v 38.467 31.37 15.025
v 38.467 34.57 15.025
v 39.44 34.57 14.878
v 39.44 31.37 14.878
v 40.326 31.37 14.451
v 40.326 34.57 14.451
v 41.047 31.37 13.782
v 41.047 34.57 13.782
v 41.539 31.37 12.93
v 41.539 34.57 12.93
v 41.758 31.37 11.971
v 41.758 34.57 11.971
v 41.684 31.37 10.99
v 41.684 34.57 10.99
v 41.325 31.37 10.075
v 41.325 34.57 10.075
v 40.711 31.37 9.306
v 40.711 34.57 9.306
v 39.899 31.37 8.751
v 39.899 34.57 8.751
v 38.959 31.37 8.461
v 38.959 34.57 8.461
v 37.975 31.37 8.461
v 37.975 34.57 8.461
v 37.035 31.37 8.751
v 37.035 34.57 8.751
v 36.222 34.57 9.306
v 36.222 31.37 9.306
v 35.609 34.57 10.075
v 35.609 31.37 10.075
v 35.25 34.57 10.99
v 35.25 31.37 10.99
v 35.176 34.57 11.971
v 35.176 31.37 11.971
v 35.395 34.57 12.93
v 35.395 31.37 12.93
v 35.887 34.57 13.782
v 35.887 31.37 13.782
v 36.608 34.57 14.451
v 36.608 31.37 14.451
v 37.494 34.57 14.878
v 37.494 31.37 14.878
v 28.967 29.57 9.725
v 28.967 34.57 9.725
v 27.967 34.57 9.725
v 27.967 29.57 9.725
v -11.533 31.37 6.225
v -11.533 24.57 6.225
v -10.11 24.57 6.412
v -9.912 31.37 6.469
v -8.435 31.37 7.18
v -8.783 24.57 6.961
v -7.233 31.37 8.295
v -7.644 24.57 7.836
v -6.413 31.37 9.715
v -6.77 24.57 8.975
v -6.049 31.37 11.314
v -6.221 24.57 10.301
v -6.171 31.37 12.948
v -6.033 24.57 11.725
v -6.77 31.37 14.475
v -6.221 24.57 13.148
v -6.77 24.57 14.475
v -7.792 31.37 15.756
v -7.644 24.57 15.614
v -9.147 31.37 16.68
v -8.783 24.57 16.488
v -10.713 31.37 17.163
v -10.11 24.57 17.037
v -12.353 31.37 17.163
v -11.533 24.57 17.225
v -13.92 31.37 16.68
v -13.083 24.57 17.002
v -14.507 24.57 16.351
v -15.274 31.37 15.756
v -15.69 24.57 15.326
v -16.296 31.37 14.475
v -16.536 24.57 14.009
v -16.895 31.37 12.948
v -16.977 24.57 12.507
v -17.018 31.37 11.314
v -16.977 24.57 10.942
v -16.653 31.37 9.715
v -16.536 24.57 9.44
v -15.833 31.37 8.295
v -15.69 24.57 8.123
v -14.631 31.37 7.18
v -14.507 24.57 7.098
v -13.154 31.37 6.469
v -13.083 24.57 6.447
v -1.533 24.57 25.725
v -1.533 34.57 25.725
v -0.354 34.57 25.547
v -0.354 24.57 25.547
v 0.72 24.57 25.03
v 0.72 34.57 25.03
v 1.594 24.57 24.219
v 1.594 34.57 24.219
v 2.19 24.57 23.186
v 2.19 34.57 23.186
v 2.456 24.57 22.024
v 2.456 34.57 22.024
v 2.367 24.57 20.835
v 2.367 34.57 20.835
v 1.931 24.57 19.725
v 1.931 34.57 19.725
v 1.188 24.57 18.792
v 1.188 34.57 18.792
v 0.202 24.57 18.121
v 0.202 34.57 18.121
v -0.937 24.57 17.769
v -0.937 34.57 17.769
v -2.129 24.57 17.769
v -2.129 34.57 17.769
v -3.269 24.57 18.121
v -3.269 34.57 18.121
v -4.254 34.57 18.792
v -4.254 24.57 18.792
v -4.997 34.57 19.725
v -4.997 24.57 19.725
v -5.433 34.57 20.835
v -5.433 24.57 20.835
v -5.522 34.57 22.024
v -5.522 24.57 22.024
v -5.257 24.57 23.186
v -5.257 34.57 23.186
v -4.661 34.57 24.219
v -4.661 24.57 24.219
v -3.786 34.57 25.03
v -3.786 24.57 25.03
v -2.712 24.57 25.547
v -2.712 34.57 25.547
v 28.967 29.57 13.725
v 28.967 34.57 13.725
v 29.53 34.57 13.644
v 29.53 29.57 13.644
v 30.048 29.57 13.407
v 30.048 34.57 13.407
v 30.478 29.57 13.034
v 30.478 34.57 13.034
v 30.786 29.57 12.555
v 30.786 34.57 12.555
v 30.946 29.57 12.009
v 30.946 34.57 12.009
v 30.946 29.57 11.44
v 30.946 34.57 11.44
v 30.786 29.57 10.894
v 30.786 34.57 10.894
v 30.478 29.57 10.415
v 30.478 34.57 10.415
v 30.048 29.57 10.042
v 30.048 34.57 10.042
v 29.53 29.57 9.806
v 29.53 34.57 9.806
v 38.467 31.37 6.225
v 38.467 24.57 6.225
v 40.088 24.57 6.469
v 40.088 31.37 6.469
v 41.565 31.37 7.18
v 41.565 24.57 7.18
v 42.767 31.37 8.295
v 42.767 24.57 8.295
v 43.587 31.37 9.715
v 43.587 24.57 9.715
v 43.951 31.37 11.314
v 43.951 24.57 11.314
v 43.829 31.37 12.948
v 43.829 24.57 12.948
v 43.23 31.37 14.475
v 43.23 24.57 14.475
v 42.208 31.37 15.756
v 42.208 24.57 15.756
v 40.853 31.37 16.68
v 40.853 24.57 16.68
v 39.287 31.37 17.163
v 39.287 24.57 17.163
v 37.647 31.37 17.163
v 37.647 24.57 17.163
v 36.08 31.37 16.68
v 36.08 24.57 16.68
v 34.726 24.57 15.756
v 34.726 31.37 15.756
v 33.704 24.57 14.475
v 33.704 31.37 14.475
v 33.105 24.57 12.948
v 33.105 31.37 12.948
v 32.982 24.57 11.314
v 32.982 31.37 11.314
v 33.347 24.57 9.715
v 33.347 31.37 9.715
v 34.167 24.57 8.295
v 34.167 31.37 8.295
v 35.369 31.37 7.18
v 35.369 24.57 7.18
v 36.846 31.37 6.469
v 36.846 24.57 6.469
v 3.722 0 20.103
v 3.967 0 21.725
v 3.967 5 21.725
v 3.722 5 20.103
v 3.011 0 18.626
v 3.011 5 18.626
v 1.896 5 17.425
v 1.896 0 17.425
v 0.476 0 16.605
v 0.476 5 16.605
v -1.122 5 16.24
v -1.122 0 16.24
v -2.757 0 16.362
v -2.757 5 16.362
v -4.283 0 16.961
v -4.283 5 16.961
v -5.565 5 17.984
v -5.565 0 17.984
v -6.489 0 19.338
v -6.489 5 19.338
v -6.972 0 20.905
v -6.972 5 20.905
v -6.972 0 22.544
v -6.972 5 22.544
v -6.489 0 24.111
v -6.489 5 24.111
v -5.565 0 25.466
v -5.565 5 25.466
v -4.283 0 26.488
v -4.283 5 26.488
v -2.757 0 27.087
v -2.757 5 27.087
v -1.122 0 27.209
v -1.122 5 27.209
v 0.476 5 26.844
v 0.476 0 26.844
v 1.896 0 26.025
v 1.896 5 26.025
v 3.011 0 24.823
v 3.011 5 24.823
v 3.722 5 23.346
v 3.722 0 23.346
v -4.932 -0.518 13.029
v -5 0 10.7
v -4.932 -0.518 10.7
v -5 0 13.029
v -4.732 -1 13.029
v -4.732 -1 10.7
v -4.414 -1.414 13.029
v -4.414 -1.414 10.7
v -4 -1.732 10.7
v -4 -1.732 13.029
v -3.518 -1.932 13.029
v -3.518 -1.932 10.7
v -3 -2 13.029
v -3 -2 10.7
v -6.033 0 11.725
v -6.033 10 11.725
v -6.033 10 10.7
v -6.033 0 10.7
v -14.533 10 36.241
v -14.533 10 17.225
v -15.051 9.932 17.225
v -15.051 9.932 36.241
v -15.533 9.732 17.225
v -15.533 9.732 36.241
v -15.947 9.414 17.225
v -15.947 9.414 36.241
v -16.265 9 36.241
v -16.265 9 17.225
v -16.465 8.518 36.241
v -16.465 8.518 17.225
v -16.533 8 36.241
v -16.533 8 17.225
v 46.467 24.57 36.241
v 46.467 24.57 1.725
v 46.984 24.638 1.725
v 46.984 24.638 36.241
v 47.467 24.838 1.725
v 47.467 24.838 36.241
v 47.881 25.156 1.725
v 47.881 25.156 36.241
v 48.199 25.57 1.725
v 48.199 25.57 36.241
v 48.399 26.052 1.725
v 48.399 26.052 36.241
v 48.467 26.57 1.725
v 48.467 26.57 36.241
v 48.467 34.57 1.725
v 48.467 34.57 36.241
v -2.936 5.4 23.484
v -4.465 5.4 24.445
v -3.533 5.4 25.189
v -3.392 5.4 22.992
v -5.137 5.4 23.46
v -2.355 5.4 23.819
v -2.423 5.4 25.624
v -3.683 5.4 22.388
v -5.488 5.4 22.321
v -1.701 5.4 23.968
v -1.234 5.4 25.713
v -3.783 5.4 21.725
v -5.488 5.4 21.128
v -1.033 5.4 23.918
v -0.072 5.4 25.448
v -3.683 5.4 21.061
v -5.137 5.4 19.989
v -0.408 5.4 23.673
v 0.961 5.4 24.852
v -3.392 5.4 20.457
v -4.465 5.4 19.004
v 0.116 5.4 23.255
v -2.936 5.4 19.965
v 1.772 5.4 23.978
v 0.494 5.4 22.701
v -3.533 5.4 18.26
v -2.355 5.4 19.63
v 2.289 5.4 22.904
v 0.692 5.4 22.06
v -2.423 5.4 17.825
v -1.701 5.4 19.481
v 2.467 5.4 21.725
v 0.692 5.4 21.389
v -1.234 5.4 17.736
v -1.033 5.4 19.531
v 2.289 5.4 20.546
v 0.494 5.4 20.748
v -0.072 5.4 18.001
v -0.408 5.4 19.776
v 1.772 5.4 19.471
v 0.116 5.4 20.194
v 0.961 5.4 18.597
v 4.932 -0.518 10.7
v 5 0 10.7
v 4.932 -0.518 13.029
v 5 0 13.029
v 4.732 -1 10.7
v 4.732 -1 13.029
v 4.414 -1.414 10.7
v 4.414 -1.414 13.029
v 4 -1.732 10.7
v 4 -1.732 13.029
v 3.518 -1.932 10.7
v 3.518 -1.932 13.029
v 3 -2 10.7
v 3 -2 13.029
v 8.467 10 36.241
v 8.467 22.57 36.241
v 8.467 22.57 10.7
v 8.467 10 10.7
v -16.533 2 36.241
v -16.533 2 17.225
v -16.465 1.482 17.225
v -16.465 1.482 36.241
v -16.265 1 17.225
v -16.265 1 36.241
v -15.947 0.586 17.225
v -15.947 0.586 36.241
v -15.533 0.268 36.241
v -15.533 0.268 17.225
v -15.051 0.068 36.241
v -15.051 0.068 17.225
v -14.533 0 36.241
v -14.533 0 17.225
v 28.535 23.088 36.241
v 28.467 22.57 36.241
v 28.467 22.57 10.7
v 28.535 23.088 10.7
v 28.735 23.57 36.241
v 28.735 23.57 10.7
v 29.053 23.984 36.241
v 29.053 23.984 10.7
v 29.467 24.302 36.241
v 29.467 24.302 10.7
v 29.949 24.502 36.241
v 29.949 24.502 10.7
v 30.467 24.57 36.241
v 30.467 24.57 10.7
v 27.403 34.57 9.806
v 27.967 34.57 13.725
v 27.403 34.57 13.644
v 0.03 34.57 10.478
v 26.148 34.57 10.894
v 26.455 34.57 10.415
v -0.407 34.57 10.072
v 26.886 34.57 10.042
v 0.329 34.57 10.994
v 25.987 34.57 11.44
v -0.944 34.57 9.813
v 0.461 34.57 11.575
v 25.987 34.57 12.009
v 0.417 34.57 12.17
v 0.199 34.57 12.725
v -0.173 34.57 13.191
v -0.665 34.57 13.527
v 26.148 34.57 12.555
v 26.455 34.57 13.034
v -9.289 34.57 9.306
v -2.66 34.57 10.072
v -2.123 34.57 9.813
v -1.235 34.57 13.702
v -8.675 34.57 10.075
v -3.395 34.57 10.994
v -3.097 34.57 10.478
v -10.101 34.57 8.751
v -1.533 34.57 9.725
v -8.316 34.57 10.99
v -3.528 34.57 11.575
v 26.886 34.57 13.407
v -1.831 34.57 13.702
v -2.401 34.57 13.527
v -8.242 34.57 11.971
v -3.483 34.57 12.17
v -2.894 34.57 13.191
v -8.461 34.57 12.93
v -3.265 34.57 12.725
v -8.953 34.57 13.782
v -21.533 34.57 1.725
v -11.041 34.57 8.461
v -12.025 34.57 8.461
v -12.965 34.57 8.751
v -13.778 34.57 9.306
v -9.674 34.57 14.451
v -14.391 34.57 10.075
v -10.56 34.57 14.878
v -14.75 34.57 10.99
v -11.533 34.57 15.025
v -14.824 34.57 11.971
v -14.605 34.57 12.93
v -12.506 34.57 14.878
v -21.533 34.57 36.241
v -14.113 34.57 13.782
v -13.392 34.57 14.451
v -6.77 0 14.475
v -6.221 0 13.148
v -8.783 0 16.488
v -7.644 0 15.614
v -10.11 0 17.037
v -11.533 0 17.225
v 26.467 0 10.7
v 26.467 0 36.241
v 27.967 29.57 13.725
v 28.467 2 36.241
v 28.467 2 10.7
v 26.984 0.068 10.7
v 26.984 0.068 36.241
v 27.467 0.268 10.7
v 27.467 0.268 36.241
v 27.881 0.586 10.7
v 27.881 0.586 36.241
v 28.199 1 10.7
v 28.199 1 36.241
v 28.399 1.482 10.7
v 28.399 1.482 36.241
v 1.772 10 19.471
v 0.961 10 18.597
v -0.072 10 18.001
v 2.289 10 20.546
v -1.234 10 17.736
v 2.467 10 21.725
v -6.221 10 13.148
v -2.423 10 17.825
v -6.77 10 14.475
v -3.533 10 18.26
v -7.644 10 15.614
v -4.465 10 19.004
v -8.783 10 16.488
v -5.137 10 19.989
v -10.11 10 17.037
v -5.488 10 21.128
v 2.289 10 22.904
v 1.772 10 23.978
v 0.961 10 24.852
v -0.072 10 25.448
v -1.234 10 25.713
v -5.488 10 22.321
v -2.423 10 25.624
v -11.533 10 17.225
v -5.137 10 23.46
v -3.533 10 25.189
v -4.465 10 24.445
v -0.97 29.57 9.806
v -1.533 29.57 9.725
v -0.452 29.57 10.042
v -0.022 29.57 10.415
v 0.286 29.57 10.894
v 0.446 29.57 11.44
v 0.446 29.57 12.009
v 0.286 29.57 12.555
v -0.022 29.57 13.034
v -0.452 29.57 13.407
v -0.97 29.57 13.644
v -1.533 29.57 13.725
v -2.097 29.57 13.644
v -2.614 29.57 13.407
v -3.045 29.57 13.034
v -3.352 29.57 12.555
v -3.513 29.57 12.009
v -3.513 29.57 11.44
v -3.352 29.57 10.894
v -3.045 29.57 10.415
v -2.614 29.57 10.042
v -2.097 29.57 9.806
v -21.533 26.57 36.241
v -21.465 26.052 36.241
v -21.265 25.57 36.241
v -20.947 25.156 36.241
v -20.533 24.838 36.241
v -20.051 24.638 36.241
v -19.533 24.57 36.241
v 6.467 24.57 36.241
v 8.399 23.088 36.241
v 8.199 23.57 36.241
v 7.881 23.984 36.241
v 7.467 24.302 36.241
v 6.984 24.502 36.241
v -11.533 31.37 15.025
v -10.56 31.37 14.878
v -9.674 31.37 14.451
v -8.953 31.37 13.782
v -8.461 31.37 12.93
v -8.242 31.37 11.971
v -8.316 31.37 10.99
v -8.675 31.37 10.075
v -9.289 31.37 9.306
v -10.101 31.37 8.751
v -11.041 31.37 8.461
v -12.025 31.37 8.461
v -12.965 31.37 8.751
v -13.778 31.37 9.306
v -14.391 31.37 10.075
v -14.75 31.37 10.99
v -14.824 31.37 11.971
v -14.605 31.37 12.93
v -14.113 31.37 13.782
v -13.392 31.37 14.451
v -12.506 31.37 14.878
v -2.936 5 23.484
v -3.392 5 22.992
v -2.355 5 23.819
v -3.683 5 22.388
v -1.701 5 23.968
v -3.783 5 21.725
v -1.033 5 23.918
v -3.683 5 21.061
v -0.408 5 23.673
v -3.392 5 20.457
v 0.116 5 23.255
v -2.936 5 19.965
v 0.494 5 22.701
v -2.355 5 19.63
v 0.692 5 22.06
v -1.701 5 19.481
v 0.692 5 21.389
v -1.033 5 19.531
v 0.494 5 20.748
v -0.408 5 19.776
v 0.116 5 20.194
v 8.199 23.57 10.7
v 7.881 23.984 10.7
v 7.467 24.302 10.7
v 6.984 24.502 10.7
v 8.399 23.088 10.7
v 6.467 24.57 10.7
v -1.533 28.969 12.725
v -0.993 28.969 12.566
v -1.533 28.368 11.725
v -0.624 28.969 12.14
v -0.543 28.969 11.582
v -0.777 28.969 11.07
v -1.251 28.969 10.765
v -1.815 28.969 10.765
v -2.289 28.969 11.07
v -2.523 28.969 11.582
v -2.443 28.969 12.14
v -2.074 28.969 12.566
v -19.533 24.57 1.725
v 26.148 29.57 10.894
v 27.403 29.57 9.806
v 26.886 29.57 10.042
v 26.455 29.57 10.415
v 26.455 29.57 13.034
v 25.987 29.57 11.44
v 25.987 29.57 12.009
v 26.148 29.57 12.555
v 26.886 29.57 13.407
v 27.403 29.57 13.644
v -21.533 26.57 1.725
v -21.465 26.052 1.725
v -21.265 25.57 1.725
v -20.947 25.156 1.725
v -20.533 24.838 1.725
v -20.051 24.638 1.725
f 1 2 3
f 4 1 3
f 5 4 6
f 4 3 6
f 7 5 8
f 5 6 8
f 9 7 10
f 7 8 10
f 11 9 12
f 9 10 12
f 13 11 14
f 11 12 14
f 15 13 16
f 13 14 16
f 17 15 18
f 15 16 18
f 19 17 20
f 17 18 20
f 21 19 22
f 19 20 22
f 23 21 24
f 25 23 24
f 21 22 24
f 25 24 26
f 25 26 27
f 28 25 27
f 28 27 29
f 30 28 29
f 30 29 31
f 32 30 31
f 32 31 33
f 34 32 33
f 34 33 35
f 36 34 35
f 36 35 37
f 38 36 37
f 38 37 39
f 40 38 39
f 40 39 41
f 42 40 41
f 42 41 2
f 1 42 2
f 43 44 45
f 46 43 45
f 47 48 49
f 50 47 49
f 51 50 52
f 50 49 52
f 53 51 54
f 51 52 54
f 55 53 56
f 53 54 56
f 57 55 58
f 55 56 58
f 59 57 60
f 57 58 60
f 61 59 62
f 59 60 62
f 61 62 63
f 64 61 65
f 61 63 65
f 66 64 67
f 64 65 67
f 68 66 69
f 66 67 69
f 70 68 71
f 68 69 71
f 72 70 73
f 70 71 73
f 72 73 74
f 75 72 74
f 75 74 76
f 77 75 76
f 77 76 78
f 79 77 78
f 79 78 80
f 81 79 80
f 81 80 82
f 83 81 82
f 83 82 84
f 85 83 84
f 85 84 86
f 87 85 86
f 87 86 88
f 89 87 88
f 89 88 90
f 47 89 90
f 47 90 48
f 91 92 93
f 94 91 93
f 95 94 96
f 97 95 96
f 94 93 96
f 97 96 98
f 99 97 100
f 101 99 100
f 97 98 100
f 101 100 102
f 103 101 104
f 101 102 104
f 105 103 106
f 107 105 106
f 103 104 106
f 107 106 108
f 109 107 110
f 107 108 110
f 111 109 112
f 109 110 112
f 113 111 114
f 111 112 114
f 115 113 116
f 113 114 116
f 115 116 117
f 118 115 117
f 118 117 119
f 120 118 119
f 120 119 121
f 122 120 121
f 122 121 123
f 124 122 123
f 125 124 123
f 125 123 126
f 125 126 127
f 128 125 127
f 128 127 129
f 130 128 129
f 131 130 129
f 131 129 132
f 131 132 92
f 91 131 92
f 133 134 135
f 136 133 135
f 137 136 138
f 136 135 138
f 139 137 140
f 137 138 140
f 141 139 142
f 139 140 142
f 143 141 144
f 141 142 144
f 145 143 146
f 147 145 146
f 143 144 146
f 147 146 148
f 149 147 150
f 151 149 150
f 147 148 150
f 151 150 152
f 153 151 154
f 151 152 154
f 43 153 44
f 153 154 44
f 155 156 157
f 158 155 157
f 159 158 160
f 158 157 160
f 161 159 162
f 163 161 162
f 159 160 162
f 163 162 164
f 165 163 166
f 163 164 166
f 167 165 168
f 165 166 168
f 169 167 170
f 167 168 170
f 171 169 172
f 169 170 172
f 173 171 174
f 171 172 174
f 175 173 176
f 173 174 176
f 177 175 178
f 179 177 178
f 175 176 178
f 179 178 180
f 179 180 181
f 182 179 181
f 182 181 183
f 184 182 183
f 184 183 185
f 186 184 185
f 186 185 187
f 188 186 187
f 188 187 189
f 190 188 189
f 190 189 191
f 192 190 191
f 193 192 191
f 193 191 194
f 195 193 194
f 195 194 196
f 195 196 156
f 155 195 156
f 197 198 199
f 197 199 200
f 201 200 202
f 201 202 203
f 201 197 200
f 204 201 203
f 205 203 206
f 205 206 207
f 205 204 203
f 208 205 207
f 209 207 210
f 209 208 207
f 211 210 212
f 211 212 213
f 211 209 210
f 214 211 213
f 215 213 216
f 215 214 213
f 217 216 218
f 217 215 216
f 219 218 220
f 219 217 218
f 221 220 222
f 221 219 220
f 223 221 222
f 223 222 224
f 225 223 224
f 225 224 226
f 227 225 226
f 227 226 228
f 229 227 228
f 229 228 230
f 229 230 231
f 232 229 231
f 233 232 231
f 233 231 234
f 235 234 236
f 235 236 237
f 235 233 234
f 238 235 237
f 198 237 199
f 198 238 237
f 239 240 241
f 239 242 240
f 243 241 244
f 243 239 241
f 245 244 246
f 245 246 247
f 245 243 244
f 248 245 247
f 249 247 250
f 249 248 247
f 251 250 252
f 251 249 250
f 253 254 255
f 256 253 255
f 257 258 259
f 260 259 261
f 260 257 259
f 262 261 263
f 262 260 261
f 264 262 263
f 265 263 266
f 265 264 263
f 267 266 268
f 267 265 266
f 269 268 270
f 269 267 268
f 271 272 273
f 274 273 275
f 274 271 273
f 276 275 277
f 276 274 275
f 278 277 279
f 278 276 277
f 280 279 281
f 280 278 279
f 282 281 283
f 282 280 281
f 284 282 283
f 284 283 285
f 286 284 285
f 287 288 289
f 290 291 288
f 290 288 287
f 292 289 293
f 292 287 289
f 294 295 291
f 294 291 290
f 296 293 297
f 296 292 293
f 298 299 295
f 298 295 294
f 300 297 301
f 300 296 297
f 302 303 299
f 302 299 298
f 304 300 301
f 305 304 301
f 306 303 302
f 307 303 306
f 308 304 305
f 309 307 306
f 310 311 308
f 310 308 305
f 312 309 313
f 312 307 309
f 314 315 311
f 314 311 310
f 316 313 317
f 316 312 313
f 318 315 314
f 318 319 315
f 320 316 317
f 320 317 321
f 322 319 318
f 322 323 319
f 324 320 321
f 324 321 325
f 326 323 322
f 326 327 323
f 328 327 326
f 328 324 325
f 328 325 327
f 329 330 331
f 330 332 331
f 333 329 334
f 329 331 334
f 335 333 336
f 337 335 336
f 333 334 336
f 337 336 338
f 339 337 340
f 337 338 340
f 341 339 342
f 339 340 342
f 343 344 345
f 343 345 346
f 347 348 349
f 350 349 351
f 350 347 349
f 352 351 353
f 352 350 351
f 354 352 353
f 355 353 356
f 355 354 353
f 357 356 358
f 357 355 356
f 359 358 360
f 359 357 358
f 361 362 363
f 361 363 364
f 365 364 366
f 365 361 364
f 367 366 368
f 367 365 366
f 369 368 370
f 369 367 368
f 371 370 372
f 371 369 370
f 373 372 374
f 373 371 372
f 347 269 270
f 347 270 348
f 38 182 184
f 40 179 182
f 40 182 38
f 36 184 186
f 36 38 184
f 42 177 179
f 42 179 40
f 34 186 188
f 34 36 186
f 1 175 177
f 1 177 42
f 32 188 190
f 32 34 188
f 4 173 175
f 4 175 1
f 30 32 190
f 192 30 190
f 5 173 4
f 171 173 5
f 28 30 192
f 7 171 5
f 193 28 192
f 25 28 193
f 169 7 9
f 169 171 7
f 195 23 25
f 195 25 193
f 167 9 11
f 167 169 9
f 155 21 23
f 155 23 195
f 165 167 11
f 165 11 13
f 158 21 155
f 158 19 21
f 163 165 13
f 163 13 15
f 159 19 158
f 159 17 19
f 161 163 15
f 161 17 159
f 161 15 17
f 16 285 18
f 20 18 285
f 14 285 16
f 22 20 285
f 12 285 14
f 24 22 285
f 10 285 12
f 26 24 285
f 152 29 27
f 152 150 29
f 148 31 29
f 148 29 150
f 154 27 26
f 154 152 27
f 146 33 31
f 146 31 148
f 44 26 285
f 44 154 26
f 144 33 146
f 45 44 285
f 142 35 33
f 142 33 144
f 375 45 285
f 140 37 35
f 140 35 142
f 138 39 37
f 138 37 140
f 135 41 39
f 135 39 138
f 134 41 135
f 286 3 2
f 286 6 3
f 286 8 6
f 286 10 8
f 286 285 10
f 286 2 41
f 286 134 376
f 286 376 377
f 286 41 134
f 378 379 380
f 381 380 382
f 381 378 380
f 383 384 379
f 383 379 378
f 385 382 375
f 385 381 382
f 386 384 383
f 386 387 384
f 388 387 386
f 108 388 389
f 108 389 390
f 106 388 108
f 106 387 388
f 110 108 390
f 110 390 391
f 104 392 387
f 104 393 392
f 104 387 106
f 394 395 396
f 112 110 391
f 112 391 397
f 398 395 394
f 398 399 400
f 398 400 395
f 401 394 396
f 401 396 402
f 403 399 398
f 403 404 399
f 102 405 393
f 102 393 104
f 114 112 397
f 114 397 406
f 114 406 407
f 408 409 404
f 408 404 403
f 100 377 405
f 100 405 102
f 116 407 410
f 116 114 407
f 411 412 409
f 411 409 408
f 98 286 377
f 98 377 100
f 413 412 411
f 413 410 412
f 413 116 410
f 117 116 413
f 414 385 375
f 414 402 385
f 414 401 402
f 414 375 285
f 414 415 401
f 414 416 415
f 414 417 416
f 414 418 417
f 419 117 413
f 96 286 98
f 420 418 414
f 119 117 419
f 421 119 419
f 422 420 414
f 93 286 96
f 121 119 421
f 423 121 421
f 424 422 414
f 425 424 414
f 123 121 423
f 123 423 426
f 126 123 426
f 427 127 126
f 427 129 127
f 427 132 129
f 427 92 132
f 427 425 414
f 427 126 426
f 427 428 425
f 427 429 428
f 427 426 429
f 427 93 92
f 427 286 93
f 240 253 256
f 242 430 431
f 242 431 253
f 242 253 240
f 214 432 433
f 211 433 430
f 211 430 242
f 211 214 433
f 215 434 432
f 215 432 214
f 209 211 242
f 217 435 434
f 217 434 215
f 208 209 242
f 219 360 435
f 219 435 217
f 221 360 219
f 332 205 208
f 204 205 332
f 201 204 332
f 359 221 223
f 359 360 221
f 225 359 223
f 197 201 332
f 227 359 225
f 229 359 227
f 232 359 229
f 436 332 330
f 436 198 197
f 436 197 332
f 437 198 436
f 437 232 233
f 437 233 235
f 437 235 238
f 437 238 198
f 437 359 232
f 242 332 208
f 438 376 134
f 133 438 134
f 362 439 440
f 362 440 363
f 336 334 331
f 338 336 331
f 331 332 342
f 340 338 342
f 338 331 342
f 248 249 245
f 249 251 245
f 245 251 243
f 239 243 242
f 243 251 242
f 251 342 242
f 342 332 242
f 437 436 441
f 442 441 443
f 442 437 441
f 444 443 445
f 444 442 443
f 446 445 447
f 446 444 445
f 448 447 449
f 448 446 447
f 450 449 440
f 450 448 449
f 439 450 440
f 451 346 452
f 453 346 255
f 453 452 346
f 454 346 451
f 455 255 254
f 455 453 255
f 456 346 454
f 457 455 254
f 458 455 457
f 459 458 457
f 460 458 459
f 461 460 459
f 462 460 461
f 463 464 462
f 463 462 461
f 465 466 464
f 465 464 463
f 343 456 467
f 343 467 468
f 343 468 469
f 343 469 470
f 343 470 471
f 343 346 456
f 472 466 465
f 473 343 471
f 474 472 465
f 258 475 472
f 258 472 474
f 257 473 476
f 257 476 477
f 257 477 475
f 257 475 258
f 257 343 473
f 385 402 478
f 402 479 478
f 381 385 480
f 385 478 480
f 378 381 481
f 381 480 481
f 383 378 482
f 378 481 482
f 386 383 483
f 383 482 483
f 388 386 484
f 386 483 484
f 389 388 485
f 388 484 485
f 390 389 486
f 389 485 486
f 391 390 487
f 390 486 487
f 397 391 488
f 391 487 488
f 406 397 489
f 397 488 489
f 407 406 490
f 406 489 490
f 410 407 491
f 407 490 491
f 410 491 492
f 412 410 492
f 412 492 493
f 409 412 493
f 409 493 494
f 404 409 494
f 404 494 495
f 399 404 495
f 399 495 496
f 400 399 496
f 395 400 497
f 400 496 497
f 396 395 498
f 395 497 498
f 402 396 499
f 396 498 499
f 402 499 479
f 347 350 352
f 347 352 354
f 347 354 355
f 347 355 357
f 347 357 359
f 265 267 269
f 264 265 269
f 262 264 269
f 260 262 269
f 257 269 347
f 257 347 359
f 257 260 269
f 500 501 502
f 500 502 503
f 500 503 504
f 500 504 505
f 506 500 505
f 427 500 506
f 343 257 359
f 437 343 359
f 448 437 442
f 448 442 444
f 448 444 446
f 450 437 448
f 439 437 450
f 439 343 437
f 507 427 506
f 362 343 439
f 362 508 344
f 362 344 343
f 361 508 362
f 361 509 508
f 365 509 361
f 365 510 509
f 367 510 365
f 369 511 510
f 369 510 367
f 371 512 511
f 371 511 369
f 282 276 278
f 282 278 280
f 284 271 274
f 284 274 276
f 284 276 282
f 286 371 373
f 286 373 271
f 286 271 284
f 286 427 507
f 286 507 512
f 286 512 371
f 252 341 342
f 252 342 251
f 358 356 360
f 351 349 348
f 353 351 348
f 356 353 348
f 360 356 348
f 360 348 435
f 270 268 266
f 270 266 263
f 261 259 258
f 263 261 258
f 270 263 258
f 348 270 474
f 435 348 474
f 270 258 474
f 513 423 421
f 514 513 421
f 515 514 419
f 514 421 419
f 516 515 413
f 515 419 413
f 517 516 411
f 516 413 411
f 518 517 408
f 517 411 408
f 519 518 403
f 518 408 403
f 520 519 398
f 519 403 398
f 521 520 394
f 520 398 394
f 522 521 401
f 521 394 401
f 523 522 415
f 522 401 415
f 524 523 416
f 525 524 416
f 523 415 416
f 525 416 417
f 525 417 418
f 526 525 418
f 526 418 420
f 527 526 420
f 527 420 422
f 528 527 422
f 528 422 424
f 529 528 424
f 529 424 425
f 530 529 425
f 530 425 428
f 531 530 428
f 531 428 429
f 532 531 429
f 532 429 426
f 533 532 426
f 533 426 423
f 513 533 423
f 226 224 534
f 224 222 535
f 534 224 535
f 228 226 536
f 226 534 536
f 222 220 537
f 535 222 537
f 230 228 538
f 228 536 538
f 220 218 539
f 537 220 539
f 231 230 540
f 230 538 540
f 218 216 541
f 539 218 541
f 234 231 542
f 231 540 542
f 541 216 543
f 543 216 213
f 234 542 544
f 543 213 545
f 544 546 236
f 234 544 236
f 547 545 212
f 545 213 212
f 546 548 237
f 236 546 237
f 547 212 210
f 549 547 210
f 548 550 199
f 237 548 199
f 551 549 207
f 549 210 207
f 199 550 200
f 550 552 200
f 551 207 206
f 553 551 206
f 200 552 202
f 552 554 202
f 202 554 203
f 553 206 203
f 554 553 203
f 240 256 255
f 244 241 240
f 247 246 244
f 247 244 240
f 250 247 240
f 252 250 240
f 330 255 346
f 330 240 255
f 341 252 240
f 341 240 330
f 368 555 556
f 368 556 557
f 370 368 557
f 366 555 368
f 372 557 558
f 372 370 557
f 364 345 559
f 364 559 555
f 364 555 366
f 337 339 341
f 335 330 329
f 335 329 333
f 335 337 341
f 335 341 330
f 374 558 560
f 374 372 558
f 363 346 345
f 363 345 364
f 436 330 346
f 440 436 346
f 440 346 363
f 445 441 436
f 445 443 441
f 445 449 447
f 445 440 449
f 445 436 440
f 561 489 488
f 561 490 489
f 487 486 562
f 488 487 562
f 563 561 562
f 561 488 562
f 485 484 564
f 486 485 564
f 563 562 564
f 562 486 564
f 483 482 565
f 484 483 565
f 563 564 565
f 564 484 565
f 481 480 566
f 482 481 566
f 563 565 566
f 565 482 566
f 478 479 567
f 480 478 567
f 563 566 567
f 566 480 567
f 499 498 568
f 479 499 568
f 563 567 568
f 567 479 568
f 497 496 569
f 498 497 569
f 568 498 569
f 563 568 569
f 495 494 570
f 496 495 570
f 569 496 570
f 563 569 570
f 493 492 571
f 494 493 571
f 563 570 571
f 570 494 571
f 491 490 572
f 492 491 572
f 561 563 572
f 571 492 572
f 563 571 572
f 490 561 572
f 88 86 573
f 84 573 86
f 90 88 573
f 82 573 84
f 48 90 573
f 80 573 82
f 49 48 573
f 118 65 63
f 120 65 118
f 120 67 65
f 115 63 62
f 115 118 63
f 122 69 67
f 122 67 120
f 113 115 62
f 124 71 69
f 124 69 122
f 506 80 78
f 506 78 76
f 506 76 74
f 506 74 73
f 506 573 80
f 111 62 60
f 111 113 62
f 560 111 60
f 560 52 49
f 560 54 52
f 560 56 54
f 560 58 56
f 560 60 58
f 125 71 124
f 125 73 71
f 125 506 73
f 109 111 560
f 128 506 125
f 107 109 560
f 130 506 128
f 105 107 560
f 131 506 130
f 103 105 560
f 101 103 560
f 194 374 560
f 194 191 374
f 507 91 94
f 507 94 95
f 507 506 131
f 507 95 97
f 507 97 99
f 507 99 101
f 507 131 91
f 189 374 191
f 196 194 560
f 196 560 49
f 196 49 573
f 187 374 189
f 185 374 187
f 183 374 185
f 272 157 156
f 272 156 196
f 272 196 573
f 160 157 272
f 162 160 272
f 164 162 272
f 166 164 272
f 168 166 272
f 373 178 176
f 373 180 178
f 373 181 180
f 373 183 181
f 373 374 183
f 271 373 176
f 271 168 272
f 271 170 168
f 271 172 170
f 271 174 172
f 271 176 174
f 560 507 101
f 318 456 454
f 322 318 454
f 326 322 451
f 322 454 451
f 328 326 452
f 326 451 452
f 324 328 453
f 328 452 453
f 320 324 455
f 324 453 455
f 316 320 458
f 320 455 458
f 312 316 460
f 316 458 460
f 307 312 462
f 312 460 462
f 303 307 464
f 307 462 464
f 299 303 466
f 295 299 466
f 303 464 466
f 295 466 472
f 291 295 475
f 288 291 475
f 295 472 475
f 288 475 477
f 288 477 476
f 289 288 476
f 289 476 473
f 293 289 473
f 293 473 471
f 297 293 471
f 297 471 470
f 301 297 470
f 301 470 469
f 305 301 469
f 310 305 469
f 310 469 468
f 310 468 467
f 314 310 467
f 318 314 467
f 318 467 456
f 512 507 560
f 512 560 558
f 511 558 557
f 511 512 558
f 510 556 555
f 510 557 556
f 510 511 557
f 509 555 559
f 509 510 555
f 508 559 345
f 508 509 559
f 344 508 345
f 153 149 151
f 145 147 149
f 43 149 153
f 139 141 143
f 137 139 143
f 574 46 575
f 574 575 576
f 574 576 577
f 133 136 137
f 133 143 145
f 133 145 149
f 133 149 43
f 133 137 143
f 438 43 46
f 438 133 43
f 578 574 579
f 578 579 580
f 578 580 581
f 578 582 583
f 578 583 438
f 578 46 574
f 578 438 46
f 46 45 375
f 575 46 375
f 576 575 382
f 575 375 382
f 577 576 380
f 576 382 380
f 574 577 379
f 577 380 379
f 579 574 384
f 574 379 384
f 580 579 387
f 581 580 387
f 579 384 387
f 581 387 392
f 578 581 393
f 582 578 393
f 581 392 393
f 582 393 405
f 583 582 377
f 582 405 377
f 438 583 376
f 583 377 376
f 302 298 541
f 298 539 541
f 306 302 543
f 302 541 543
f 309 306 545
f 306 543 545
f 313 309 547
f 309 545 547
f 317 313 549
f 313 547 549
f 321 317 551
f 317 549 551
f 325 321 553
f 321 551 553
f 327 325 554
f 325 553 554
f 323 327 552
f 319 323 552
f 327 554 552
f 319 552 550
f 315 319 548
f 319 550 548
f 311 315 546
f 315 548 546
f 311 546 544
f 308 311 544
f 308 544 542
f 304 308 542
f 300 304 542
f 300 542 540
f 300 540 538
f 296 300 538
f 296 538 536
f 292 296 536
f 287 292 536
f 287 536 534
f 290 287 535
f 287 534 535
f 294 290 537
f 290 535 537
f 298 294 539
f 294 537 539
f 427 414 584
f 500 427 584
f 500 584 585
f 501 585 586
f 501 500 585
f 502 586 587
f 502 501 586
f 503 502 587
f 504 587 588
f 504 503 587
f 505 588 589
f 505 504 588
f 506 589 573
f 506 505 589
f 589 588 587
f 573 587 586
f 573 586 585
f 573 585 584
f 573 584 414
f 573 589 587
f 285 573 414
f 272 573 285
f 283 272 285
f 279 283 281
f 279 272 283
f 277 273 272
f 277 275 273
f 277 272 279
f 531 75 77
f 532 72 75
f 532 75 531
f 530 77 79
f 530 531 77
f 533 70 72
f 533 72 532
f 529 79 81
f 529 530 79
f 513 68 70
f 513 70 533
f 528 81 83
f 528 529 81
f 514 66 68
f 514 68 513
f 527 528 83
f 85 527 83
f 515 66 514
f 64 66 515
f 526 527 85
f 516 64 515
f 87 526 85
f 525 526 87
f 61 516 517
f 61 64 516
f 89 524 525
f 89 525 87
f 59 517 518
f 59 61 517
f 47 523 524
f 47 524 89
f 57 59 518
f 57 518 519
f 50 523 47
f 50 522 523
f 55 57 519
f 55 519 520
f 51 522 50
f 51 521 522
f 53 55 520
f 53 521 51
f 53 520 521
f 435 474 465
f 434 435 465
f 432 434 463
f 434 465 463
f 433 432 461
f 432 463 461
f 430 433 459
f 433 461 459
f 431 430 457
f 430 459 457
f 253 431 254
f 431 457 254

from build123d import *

# Parameters (mm, degrees)
SKETCH_8_W                = 70
SKETCH_8_H                = 30
EXTRUDE_3_DEPTH           = 34.57
SKETCH_9_W                = 30
SKETCH_9_H                = 14.57
SKETCH_9_W_2              = 20
CUT_EXTRUDE_3_DEPTH       = 67.664217758
OTHER_1_OUTLINE_R         = 5.5
OTHER_1_DEPTH             = 5
HOLE_WIZARD_2_D           = 4.5
HOLE_WIZARD_2_DEPTH       = 10
HOLE_WIZARD_2_CBORE_D     = 8
HOLE_WIZARD_2_CBORE_DEPTH = 4.6
BACK_REACH                = 69.458
SKETCH_16_W               = 70
SKETCH_16_H               = 8.975361008
MM_1_D                    = 4
MM_1_DEPTH                = 5
MM_1_TIP                  = 1.201721238
CUT_EXTRUDE_5_DEPTH       = 5
SKETCH_24_W               = 5
SKETCH_24_H               = 21.024638992
SKETCH_24_W_2             = 20
CUT_EXTRUDE_6_DEPTH       = 10
HOLE_WIZARD_3_D           = 6.6
HOLE_WIZARD_3_DEPTH       = 10
HOLE_WIZARD_3_CBORE_D     = 11
HOLE_WIZARD_3_CBORE_DEPTH = 6.8
FILLET_1_R                = 2
SKETCH_29_W               = 10
SKETCH_29_H               = 2
EXTRUDE_5_DEPTH           = 2.329281552
FILLET_3_R                = 2
CUT_EXTRUDE_7_DEPTH       = 0.5
EXTRUDE_START             = 5.016506595
EXTRUDE_6_DEPTH           = 5.016506595
SKETCH_33_R               = 4
CUT_EXTRUDE_8_DEPTH       = 24.57
CUT_EXTRUDE_9_DEPTH       = 67.093990688


# Read off the part's stored shape, not the designer's step: 孔1
with BuildPart() as part:
    # 草图8 → 凸台-拉伸3 (new body)
    with BuildSketch(Plane(origin=(0, 0, 0), x_dir=(1, 0, 0), z_dir=(0, 1, 0))):
        with Locations((13.466824006, -16.724598186)):
            Rectangle(SKETCH_8_W, SKETCH_8_H)
    extrude(amount=EXTRUDE_3_DEPTH)

    # 草图9 → 切除-拉伸3 (cut, through all)
    with BuildSketch(Plane.XY.offset(31.724598186)):
        with Locations((-6.533175994, 17.285)):
            Rectangle(SKETCH_9_W, SKETCH_9_H)
        with Locations((38.466824006, 17.285)):
            Rectangle(SKETCH_9_W_2, SKETCH_9_H)
    extrude(amount=-CUT_EXTRUDE_3_DEPTH, mode=Mode.SUBTRACT)

    # 孔1 outline → 孔1 (cut)
    with BuildSketch(Plane(origin=(0, 0, 0), x_dir=(1, 0, 0), z_dir=(0, 1, 0))):
        with Locations((-1.533175994, -21.724598186)):
            Circle(OTHER_1_OUTLINE_R)
    extrude(amount=OTHER_1_DEPTH, mode=Mode.SUBTRACT)

    # 打孔尺寸(%根据)内六角圆柱头螺钉的类型2
    with Locations(Plane(origin=(-1.533175994, 10, 21.724598186), x_dir=(1, 0, 0), z_dir=(0, 1, 0))):
        with Locations((0, 0)):
            CounterBoreHole(HOLE_WIZARD_2_D / 2, HOLE_WIZARD_2_CBORE_D / 2, HOLE_WIZARD_2_CBORE_DEPTH, depth=HOLE_WIZARD_2_DEPTH)

    # back: up to this face of the body (flat: up to its plane)
    back_end = Plane(part.part.faces().sort_by_distance((-6.533175994, 24.57, 16.724598186))[0])
    # 草图16 → back (cut, up to the picked face)
    with BuildSketch(Plane(origin=(0, 0, 0), x_dir=(1, 0, 0), z_dir=(0, 1, 0)), mode=Mode.PRIVATE) as back_sk1:
        with Locations((13.466824006, -6.21227869)):
            Rectangle(SKETCH_16_W, SKETCH_16_H)
    back_tool1 = split(extrude(back_sk1.sketch, amount=BACK_REACH, mode=Mode.PRIVATE), bisect_by=back_end, keep=Keep.BOTH, mode=Mode.PRIVATE)
    add(back_tool1.solids().sort_by(Axis((13.466824, 0, 6.212279), (0, 1, 0)))[0], mode=Mode.SUBTRACT)

    # 大小mm 暗销孔1
    with Locations(Plane(origin=(-1.533175994, 34.57, 11.724598186), x_dir=(0, 0, 1), z_dir=(0, 1, 0))):
        with Locations((0, 0)):
            Hole(MM_1_D / 2, depth=MM_1_DEPTH)
            with Locations((0, 0, -(MM_1_DEPTH + MM_1_TIP / 2))):  # 118° drill point
                Cone(0, MM_1_D / 2, MM_1_TIP, mode=Mode.SUBTRACT)

    # 草图23 → 切除-拉伸5 (cut)
    with BuildSketch(Plane.XZ.offset(-34.57)):
        with BuildLine():
            Line((28.966824006, 9.724598186), (27.966824006, 9.724598186))
            ThreePointArc((27.966824006, 9.724598186), (25.966824006, 11.724598186), (27.966824006, 13.724598186))
            Line((27.966824006, 13.724598186), (28.966824006, 13.724598186))
            ThreePointArc((28.966824006, 13.724598186), (30.966824006, 11.724598186), (28.966824006, 9.724598186))
        make_face()
    extrude(amount=CUT_EXTRUDE_5_DEPTH, mode=Mode.SUBTRACT)

    # 草图24 → 切除-拉伸6 (cut)
    with BuildSketch(Plane(origin=(0, 0, 0), x_dir=(1, 0, 0), z_dir=(0, 1, 0))):
        with Locations((-19.033175994, -21.21227869)):
            Rectangle(SKETCH_24_W, SKETCH_24_H)
        with Locations((38.466824006, -21.21227869)):
            Rectangle(SKETCH_24_W_2, SKETCH_24_H)
    extrude(amount=CUT_EXTRUDE_6_DEPTH, mode=Mode.SUBTRACT)

    # 打孔尺寸(%根据)内六角圆柱头螺钉的类型3
    with Locations(Plane(origin=(-11.533175994, 24.57, 11.724598186), x_dir=(0, 0, -1), z_dir=(0, -1, 0))):
        with Locations((0, 0), (0, 50)):
            CounterBoreHole(HOLE_WIZARD_3_D / 2, HOLE_WIZARD_3_CBORE_D / 2, HOLE_WIZARD_3_CBORE_DEPTH, depth=HOLE_WIZARD_3_DEPTH)

    # 圆角1
    fillet_1_edges = [part.edges().sort_by_distance(p)[0] for p in [
        (-16.533175994, 0, 21.21227869),
        (-16.533175994, 10, 21.21227869),
        (28.466824006, 0, 21.21227869),
        (-21.533175994, 24.57, 16.724598186),
        (48.466824006, 24.57, 16.724598186),
        (8.466824006, 24.57, 21.21227869),
        (28.466824006, 24.57, 21.21227869),
    ]]
    fillet(fillet_1_edges, radius=FILLET_1_R)

    # 草图29 → 凸台-拉伸5 (add)
    with BuildSketch(Plane(origin=(0, 0, 10.699959194), x_dir=(-1, 0, 0), z_dir=(0, 0, -1))):
        with Locations((0, -1)):
            Rectangle(SKETCH_29_W, SKETCH_29_H)
    extrude(amount=-EXTRUDE_5_DEPTH)

    # 圆角3
    fillet_3_edges = [part.edges().sort_by_distance(p)[0] for p in [
        (-5, -2, 11.86459997),
        (5, -2, 11.86459997),
    ]]
    fillet(fillet_3_edges, radius=FILLET_3_R - 0.0001)  # a hair under: the kernel refuses the full size

    # 草图30 → 切除-拉伸7 (cut)
    with BuildSketch(Plane.XY.offset(31.724598186)):
        with BuildLine():
            Line((-14.533175994, 0), (26.466824006, 0))
            ThreePointArc((26.466824006, 0), (27.881037569, 0.585786438), (28.466824006, 2))
            Line((28.466824006, 2), (28.466824006, 22.57))
            ThreePointArc((28.466824006, 22.57), (29.052610444, 23.984213562), (30.466824006, 24.57))
            Line((30.466824006, 24.57), (46.466824006, 24.57))
            ThreePointArc((46.466824006, 24.57), (47.881037569, 25.155786438), (48.466824006, 26.57))
            Line((48.466824006, 26.57), (48.466824006, 34.57))
            Line((48.466824006, 34.57), (-21.533175994, 34.57))
            Line((-21.533175994, 34.57), (-21.533175994, 26.57))
            ThreePointArc((-21.533175994, 26.57), (-20.947389556, 25.155786438), (-19.533175994, 24.57))
            Line((-19.533175994, 24.57), (6.466824006, 24.57))
            ThreePointArc((6.466824006, 24.57), (7.881037569, 23.984213562), (8.466824006, 22.57))
            Line((8.466824006, 22.57), (8.466824006, 10))
            Line((8.466824006, 10), (-14.533175994, 10))
            ThreePointArc((-14.533175994, 10), (-15.947389556, 9.414213562), (-16.533175994, 8))
            Line((-16.533175994, 8), (-16.533175994, 2))
            ThreePointArc((-16.533175994, 2), (-15.947389556, 0.585786438), (-14.533175994, 0))
        make_face()
    extrude(amount=-CUT_EXTRUDE_7_DEPTH, mode=Mode.SUBTRACT)

    # 草图31 → 凸台-拉伸6 (add)
    with BuildSketch(Plane.XY.offset(31.224598186).offset(EXTRUDE_START)):
        with BuildLine():
            Line((-14.533175994, 0), (26.466824006, 0))
            ThreePointArc((26.466824006, 0), (27.881037569, 0.585786438), (28.466824006, 2))
            Line((28.466824006, 2), (28.466824006, 22.57))
            ThreePointArc((28.466824006, 22.57), (29.052610444, 23.984213562), (30.466824006, 24.57))
            Line((30.466824006, 24.57), (46.466824006, 24.57))
            ThreePointArc((46.466824006, 24.57), (47.881037569, 25.155786438), (48.466824006, 26.57))
            Line((48.466824006, 26.57), (48.466824006, 34.57))
            Line((48.466824006, 34.57), (-21.533175994, 34.57))
            Line((-21.533175994, 34.57), (-21.533175994, 26.57))
            ThreePointArc((-21.533175994, 26.57), (-20.947389556, 25.155786438), (-19.533175994, 24.57))
            Line((-19.533175994, 24.57), (6.466824006, 24.57))
            ThreePointArc((6.466824006, 24.57), (7.881037569, 23.984213562), (8.466824006, 22.57))
            Line((8.466824006, 22.57), (8.466824006, 10))
            Line((8.466824006, 10), (-14.533175994, 10))
            ThreePointArc((-14.533175994, 10), (-15.947389556, 9.414213562), (-16.533175994, 8))
            Line((-16.533175994, 8), (-16.533175994, 2))
            ThreePointArc((-16.533175994, 2), (-15.947389556, 0.585786438), (-14.533175994, 0))
        make_face()
    extrude(amount=-EXTRUDE_6_DEPTH)

    # 草图33 → 切除-拉伸8 (cut)
    with BuildSketch(Plane(origin=(0, 34.57, 0), x_dir=(1, 0, 0), z_dir=(0, 1, 0))):
        with Locations(Location((-1.533175994, -21.724598186, 0), (0, 0, 270))):
            Circle(SKETCH_33_R)
    extrude(amount=-CUT_EXTRUDE_8_DEPTH, mode=Mode.SUBTRACT)

    # 草图34 → 切除-拉伸9 (cut, through all)
    with BuildSketch(Plane.XZ.offset(-24.57)):
        with BuildLine():
            Line((-17.033175994, 17.224598186), (-11.533175994, 17.224598186))
            ThreePointArc((-11.533175994, 17.224598186), (-7.644088697, 15.613685483), (-6.033175994, 11.724598186))
            Line((-6.033175994, 11.724598186), (-6.033175994, 6.224598186))
            Line((-6.033175994, 6.224598186), (-17.033175994, 6.224598186))
            Line((-17.033175994, 6.224598186), (-17.033175994, 17.224598186))
        make_face()
    extrude(amount=CUT_EXTRUDE_9_DEPTH, mode=Mode.SUBTRACT)


solid = part.part
